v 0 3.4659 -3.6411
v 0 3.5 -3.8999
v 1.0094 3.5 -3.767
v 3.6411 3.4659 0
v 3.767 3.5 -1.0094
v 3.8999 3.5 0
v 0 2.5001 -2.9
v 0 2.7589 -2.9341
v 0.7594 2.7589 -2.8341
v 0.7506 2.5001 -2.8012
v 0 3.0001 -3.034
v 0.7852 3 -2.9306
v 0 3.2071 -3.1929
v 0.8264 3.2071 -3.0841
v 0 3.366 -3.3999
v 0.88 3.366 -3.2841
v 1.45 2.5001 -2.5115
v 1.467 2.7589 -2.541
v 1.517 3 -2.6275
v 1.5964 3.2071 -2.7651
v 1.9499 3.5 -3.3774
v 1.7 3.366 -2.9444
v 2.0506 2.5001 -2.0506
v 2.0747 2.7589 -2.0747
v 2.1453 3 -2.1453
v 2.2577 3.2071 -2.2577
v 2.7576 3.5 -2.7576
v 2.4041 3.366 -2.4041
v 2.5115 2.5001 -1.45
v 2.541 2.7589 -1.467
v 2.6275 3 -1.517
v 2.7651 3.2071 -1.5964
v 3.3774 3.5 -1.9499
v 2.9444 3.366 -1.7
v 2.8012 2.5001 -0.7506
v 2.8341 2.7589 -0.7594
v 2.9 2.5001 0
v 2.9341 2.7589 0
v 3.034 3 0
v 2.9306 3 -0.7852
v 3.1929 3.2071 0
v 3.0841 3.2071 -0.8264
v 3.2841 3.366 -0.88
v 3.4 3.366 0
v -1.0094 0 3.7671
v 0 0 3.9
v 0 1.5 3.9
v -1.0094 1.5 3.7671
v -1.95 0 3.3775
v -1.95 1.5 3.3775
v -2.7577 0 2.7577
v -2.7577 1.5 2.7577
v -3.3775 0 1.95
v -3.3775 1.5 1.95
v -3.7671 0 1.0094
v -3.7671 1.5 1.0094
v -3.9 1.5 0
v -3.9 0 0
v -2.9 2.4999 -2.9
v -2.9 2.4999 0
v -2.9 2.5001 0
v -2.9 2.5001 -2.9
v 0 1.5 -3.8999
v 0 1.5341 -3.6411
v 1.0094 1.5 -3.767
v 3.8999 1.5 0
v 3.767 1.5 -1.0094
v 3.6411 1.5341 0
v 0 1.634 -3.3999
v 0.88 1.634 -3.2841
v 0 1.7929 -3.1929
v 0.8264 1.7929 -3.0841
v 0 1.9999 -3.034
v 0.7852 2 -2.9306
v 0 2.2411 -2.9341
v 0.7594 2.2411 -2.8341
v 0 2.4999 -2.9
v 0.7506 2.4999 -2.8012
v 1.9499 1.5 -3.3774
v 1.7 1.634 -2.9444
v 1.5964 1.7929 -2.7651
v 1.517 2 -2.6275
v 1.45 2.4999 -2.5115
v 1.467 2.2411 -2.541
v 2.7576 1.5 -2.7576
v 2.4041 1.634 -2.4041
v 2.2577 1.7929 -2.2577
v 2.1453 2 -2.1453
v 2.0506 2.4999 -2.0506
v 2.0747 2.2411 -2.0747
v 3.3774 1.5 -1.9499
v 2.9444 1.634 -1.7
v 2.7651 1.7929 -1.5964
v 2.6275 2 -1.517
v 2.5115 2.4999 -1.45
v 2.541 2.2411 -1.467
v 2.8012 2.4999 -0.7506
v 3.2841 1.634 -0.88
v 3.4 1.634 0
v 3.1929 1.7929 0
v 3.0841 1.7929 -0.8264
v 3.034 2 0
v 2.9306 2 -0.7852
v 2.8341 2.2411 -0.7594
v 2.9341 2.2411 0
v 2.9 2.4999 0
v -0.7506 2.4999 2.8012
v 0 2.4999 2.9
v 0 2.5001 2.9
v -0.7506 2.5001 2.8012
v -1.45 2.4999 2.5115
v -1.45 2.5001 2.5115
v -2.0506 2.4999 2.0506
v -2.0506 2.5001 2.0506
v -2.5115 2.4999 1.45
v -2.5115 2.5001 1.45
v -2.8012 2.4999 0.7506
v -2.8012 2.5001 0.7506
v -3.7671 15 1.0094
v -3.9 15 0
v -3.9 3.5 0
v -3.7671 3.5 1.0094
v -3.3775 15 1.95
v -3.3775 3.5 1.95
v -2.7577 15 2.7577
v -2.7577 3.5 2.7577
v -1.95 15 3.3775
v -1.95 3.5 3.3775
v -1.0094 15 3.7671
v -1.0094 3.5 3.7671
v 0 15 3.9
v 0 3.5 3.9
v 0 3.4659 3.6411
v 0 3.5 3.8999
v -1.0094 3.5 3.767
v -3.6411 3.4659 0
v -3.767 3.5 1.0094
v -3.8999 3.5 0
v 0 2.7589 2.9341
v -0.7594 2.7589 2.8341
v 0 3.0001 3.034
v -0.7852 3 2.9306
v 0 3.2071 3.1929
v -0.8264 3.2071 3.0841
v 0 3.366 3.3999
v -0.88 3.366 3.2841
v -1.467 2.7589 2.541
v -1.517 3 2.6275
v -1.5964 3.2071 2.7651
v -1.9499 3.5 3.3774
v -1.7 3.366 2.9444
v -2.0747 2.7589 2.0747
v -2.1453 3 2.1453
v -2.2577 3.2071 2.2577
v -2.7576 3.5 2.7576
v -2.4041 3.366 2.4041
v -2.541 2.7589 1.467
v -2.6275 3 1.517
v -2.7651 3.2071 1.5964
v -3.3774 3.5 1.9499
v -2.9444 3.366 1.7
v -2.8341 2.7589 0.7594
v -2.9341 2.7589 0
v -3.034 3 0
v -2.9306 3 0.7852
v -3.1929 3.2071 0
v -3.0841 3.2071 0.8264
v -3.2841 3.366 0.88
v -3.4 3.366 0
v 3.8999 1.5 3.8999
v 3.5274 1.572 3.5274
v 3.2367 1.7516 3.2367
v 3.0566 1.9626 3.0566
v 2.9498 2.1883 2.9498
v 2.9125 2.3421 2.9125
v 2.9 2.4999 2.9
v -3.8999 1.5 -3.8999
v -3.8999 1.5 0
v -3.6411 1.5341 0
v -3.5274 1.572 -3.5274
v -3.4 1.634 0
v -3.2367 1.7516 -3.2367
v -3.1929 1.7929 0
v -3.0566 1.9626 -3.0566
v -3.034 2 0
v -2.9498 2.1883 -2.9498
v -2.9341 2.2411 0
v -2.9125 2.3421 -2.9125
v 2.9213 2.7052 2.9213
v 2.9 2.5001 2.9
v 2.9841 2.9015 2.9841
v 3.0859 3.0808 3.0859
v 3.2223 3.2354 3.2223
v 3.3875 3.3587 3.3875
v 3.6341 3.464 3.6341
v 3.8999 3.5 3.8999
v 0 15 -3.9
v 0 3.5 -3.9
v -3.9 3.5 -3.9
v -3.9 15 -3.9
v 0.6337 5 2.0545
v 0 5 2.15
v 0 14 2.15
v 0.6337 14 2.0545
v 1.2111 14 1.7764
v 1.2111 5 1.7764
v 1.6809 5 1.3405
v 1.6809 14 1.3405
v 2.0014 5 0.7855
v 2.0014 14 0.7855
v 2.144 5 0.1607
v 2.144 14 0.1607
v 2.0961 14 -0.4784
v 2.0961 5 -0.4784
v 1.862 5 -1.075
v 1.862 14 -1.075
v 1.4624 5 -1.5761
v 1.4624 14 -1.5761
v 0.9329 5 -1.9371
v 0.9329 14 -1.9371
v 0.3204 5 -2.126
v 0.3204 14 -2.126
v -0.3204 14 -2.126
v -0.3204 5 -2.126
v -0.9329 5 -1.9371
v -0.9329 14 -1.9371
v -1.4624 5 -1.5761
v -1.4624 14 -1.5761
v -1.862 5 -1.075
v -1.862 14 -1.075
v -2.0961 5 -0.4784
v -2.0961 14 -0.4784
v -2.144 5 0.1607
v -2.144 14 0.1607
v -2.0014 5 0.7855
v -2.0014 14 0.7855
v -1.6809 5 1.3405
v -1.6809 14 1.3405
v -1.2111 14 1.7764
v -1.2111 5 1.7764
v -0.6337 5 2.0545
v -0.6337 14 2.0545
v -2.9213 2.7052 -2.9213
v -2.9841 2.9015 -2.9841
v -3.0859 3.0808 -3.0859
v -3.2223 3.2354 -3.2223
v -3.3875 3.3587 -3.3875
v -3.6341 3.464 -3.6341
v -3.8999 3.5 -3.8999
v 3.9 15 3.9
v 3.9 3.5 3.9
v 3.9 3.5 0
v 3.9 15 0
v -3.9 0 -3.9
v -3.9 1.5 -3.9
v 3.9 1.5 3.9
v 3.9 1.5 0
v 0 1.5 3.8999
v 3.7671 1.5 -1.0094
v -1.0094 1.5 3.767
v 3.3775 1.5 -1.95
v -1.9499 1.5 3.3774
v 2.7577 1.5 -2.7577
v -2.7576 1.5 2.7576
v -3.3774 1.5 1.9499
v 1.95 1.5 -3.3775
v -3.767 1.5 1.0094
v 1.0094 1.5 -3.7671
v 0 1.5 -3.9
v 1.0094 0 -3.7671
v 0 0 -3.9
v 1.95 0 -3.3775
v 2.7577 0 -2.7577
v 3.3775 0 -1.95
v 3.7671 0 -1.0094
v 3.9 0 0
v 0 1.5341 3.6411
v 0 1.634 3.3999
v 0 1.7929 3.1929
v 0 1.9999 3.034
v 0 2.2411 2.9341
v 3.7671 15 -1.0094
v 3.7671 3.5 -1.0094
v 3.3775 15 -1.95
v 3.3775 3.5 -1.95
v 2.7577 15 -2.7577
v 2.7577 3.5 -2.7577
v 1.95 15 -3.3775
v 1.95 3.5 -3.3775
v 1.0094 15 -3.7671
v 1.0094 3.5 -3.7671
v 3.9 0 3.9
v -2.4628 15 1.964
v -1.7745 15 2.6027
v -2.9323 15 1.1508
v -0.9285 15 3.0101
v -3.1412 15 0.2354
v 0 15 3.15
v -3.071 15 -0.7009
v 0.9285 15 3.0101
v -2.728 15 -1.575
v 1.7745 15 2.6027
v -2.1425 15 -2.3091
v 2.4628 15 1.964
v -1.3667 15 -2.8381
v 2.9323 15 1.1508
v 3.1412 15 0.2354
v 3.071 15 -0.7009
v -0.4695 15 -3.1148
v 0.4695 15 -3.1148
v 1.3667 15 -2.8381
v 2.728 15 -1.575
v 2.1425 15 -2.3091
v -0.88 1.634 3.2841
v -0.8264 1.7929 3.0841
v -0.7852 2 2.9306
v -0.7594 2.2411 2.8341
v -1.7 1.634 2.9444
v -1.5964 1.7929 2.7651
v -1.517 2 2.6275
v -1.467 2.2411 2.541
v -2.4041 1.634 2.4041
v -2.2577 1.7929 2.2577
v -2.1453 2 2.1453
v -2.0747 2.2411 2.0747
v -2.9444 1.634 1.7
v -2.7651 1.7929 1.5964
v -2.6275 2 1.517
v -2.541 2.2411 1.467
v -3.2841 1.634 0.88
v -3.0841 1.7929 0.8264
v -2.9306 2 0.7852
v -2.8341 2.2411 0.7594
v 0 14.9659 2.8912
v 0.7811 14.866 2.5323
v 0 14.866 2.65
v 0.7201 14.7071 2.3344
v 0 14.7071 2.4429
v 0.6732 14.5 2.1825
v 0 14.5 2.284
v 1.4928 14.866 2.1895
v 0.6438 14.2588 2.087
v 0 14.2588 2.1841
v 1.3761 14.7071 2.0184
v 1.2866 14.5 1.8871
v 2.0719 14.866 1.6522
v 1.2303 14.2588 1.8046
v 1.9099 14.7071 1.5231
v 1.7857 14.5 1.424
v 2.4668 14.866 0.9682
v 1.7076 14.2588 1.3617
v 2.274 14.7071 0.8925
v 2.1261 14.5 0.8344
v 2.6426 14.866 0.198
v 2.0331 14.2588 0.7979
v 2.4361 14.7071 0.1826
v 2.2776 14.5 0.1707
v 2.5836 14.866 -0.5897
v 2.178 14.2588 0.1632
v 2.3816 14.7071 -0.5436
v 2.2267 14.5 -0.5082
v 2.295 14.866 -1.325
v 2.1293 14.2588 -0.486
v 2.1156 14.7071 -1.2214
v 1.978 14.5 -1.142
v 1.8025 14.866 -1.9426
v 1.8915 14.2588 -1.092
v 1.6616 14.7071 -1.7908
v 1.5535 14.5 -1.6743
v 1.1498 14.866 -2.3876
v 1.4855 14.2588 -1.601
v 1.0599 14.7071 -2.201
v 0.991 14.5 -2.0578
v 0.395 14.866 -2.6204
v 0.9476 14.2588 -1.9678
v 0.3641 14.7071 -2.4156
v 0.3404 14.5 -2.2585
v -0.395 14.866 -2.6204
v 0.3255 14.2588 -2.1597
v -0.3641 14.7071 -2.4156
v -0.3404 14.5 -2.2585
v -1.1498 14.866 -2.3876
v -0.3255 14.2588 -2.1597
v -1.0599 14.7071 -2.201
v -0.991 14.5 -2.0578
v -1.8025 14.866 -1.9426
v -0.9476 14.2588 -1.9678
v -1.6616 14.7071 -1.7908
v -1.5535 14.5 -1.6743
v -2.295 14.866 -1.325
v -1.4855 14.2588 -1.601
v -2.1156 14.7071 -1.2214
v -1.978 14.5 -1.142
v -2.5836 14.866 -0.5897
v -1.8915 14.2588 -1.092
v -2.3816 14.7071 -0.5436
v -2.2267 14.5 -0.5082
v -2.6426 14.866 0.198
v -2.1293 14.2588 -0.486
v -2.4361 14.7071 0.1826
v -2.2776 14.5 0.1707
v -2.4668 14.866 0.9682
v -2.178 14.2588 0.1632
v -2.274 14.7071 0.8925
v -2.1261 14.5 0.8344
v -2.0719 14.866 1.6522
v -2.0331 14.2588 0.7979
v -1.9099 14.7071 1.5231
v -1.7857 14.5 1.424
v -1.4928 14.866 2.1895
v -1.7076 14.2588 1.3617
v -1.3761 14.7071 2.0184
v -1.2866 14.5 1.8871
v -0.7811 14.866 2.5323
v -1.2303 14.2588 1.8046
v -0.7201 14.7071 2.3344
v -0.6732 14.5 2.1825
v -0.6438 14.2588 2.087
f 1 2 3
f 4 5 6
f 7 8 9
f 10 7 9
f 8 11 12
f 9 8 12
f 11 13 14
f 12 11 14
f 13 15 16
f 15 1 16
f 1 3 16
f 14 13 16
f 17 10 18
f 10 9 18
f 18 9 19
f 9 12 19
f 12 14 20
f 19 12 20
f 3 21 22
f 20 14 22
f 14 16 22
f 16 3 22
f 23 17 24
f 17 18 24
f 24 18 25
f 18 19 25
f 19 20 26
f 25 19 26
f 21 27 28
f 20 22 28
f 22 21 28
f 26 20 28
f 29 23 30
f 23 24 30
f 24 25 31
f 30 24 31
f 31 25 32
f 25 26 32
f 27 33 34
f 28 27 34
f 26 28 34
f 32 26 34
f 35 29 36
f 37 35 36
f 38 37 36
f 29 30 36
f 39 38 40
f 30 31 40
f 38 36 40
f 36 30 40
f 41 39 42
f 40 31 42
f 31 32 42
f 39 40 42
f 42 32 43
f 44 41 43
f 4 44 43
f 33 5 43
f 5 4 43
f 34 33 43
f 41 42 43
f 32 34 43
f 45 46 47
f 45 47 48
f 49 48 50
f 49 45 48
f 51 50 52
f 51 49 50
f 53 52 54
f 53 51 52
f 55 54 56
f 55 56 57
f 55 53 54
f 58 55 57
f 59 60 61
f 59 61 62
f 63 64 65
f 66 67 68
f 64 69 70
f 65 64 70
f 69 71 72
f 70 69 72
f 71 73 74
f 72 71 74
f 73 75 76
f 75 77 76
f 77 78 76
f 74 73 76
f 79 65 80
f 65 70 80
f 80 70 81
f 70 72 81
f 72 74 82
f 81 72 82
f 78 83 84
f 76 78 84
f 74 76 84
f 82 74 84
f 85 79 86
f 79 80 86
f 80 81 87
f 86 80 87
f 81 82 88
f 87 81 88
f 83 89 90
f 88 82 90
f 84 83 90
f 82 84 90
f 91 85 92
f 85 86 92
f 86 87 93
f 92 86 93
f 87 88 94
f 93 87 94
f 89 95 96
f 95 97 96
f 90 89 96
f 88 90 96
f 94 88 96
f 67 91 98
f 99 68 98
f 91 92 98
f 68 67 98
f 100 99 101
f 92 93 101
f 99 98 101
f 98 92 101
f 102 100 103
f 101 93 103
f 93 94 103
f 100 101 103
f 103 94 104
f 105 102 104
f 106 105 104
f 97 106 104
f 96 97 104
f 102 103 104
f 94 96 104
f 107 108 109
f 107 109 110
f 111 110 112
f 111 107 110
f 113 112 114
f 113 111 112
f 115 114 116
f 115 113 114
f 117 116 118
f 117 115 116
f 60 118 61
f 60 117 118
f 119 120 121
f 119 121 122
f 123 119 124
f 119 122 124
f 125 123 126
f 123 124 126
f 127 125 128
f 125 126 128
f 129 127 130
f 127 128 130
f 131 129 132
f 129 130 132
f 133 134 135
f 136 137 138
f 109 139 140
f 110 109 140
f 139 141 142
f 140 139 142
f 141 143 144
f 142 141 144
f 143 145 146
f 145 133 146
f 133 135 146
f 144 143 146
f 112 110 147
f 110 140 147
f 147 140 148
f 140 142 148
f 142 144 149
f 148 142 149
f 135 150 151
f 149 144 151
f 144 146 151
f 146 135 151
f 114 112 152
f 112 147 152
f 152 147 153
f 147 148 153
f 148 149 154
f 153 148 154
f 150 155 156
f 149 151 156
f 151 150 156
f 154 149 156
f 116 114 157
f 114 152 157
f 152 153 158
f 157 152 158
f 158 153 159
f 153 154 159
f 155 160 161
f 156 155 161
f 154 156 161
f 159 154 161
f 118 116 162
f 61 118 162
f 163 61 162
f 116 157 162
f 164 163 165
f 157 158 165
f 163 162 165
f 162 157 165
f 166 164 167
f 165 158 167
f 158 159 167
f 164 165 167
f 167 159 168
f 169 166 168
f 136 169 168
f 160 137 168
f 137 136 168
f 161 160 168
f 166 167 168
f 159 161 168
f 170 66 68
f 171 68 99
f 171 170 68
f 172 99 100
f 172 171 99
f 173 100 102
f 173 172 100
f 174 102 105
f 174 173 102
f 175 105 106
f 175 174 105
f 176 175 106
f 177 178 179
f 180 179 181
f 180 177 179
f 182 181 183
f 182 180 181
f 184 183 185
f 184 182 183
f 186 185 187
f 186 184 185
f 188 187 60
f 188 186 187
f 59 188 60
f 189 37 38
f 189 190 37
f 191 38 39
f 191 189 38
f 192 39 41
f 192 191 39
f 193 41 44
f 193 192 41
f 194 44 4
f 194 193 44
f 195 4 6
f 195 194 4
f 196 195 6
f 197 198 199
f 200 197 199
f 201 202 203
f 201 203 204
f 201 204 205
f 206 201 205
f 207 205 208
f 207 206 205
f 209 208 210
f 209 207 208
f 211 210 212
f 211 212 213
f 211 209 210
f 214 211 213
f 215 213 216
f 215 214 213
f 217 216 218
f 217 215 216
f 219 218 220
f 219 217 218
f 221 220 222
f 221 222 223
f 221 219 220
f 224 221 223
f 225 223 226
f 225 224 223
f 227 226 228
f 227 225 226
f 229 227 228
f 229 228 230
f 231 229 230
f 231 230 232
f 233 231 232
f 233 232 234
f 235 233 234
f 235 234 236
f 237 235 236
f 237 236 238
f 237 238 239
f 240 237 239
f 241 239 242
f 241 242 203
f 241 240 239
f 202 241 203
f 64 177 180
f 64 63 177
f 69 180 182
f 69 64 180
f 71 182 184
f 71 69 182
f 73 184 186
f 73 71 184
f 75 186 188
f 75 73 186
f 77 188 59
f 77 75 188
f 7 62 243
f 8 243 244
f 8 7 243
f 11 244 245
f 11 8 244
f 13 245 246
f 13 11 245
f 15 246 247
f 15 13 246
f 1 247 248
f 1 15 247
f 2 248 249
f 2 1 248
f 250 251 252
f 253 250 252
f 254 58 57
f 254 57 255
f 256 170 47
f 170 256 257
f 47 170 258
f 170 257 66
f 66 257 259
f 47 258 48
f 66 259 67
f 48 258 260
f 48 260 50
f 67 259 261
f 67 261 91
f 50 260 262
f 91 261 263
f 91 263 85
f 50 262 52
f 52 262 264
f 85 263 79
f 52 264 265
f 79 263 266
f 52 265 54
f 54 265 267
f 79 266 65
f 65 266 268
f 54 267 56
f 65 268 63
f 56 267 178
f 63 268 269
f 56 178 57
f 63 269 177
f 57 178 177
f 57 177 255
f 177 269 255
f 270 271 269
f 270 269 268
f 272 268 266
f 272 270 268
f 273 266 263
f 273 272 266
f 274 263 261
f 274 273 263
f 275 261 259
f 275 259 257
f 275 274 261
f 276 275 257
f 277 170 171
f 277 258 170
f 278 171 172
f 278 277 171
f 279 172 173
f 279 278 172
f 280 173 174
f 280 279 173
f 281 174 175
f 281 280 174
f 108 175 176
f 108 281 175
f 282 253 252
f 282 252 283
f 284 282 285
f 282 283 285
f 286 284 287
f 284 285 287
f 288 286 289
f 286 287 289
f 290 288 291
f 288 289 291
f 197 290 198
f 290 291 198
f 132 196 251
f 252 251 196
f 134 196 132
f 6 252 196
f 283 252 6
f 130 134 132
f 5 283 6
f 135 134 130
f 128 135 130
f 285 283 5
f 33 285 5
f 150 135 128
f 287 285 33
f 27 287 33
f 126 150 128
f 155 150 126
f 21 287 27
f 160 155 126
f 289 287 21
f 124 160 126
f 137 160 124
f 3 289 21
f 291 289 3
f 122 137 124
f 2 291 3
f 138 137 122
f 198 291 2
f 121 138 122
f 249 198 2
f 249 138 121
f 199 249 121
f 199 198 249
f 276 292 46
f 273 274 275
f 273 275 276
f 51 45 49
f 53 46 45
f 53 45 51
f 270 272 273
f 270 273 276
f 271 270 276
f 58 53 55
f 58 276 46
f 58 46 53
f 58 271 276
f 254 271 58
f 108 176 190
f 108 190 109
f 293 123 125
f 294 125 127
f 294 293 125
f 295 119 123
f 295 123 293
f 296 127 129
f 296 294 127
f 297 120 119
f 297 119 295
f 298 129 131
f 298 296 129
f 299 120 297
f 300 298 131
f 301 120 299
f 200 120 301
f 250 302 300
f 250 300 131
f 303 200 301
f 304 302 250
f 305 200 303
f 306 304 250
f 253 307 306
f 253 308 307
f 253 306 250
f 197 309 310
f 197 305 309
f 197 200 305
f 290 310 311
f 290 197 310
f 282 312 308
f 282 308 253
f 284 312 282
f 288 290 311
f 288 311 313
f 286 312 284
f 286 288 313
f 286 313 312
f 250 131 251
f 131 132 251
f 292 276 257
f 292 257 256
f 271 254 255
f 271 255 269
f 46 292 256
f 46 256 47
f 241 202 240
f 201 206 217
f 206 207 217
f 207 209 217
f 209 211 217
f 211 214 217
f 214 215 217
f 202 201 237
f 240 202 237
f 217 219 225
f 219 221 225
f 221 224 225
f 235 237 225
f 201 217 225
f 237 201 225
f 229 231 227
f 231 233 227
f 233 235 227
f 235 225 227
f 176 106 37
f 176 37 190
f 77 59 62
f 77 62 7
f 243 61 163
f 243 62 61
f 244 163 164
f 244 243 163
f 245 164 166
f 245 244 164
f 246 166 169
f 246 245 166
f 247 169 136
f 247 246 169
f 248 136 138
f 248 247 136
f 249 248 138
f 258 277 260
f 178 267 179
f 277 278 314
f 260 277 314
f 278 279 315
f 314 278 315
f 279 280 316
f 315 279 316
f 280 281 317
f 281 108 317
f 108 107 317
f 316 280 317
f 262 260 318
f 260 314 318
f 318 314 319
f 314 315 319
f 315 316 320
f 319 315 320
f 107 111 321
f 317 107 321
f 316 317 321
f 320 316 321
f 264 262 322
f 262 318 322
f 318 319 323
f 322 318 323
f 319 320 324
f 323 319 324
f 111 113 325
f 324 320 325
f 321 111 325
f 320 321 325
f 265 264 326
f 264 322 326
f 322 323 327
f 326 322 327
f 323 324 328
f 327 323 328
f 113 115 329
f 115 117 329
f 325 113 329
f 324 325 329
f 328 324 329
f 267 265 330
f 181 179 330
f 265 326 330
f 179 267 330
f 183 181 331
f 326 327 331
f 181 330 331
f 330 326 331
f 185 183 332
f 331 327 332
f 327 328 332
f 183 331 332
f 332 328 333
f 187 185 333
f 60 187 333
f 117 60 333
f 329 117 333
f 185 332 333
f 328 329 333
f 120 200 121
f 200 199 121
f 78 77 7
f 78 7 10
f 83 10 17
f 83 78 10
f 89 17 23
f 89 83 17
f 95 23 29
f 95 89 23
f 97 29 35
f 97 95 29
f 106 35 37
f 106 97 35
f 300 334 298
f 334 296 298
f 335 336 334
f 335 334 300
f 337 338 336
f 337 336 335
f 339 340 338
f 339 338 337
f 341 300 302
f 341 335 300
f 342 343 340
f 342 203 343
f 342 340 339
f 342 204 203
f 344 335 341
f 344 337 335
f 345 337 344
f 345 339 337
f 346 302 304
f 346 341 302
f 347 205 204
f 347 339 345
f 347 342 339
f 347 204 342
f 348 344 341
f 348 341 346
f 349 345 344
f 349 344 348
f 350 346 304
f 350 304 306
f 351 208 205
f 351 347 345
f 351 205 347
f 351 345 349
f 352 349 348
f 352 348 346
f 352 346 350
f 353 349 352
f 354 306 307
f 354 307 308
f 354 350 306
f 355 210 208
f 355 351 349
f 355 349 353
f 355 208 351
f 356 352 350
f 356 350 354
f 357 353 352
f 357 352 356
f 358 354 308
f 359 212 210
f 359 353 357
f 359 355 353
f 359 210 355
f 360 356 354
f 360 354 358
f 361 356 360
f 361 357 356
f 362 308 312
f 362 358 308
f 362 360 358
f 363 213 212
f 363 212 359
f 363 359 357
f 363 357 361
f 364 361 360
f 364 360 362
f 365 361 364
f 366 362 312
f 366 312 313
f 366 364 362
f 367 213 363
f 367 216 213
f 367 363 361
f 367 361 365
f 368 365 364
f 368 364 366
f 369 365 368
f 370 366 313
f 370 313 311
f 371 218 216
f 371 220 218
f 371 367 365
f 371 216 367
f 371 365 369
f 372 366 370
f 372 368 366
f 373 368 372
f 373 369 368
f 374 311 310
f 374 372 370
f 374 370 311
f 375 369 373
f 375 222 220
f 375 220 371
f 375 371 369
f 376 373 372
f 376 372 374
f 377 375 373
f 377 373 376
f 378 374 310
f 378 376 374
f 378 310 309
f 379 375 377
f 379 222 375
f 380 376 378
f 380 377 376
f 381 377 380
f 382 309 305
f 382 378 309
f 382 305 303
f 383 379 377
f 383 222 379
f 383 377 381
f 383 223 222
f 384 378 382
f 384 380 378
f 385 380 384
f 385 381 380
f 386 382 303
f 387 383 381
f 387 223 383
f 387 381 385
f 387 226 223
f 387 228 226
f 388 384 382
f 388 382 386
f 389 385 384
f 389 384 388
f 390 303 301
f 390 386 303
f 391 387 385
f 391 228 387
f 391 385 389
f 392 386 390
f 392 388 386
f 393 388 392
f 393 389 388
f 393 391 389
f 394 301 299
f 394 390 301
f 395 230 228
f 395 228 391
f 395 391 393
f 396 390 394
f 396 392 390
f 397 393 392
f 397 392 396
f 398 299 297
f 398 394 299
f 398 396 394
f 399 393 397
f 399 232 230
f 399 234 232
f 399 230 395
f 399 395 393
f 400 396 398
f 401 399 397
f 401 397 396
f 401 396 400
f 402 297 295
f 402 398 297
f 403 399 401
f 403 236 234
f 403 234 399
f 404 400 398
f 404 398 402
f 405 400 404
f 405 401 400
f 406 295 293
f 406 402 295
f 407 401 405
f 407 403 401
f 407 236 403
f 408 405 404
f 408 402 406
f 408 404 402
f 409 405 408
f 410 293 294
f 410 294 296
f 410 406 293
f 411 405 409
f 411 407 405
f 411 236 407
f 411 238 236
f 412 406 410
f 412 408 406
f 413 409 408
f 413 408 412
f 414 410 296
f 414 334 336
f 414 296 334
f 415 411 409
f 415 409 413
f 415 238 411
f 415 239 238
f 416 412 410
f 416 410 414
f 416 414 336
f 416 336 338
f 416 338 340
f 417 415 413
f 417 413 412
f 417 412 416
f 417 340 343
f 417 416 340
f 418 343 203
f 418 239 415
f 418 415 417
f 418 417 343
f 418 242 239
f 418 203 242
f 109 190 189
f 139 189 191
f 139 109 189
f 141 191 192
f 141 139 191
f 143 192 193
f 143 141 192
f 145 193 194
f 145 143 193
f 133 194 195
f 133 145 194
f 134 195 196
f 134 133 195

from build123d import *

# Parameters (mm, degrees)
BOSS_EXTRUDE1_DEPTH     = 5
CUT_EXTRUDE2_DEPTH      = 1
CUT_EXTRUDE2_DEPTH_BACK = 1
FILLET1_R               = 1
SKETCH4_R               = 2.15
BOSS_EXTRUDE3_DEPTH     = 10
FILLET2_R               = 1


with BuildPart() as part:
    # Sketch1 → Boss-Extrude1 (new body)
    with BuildSketch(Plane(origin=(0, 0, 0), x_dir=(1, 0, 0), z_dir=(0, 1, 0))):
        with BuildLine():
            Line((-3.9, 3.9), (0, 3.9))
            ThreePointArc((0, 3.9), (2.757716447, 2.757716447), (3.9, 0))
            Line((3.9, 0), (3.9, -3.9))
            Line((3.9, -3.9), (0, -3.9))
            ThreePointArc((0, -3.9), (-2.757716447, -2.757716447), (-3.9, 0))
            Line((-3.9, 0), (-3.9, 3.9))
        make_face()
    extrude(amount=BOSS_EXTRUDE1_DEPTH)

    # Sketch3 → Cut-Extrude2 (cut, two sides: drawn at the far end of the back side and taken through both)
    with BuildSketch(Plane(origin=(0, 2.5, 0), x_dir=(1, 0, 0), z_dir=(0, 1, 0)).offset(-CUT_EXTRUDE2_DEPTH_BACK)):
        with BuildLine():
            Line((-3.9, 0), (-3.9, 3.9))
            Line((-3.9, 3.9), (0, 3.9))
            ThreePointArc((0, 3.9), (2.757716447, 2.757716447), (3.9, 0))
            Line((3.9, 0), (3.9, -3.9))
            Line((3.9, -3.9), (0, -3.9))
            ThreePointArc((0, -3.9), (-2.757716447, -2.757716447), (-3.9, 0))
        make_face()
        with BuildLine():
            Line((-2.9, 0), (-2.9, 2.9))
            Line((-2.9, 2.9), (0, 2.9))
            ThreePointArc((0, 2.9), (2.050609665, 2.050609665), (2.9, 0))
            Line((2.9, 0), (2.9, -2.9))
            Line((2.9, -2.9), (0, -2.9))
            ThreePointArc((0, -2.9), (-2.050609665, -2.050609665), (-2.9, 0))
        make_face(mode=Mode.SUBTRACT)
    extrude(amount=CUT_EXTRUDE2_DEPTH + CUT_EXTRUDE2_DEPTH_BACK, mode=Mode.SUBTRACT)

    # Fillet1
    fillet1_edges = [part.edges().sort_by_distance(p)[0] for p in [
        (2.9, 3.5, 1.45),
        (2.050609665, 3.5, -2.050609665),
        (1.45, 3.5, 2.9),
        (-2.050609665, 3.5, 2.050609665),
        (2.9, 1.5, 1.45),
        (2.050609665, 1.5, -2.050609665),
        (-2.9, 1.5, -1.45),
        (1.45, 1.5, 2.9),
        (-1.45, 3.5, -2.9),
        (-2.9, 3.5, -1.45),
        (-1.45, 1.5, -2.9),
        (-2.050609665, 1.5, 2.050609665),
    ]]
    fillet(fillet1_edges, radius=FILLET1_R - 0.0001)  # a hair under: the kernel refuses the full size

    # Sketch4 → Boss-Extrude3 (add)
    with BuildSketch(Plane(origin=(0, 5, 0), x_dir=(1, 0, 0), z_dir=(0, 1, 0))):
        with BuildLine():
            Line((0, 3.9), (-3.9, 3.9))
            Line((-3.9, 3.9), (-3.9, 0))
            ThreePointArc((-3.9, 0), (-2.757716447, -2.757716447), (0, -3.9))
            Line((0, -3.9), (3.9, -3.9))
            Line((3.9, -3.9), (3.9, 0))
            ThreePointArc((3.9, 0), (2.757716447, 2.757716447), (0, 3.9))
        make_face()
        with Locations(Location((0, 0, 0), (0, 0, 270))):
            Circle(SKETCH4_R, mode=Mode.SUBTRACT)
    extrude(amount=BOSS_EXTRUDE3_DEPTH)

    # Fillet2
    fillet2_edges = [part.edges().sort_by_distance(p)[0] for p in [
        (0, 15, -2.15),
    ]]
    fillet(fillet2_edges, radius=FILLET2_R)


solid = part.part
